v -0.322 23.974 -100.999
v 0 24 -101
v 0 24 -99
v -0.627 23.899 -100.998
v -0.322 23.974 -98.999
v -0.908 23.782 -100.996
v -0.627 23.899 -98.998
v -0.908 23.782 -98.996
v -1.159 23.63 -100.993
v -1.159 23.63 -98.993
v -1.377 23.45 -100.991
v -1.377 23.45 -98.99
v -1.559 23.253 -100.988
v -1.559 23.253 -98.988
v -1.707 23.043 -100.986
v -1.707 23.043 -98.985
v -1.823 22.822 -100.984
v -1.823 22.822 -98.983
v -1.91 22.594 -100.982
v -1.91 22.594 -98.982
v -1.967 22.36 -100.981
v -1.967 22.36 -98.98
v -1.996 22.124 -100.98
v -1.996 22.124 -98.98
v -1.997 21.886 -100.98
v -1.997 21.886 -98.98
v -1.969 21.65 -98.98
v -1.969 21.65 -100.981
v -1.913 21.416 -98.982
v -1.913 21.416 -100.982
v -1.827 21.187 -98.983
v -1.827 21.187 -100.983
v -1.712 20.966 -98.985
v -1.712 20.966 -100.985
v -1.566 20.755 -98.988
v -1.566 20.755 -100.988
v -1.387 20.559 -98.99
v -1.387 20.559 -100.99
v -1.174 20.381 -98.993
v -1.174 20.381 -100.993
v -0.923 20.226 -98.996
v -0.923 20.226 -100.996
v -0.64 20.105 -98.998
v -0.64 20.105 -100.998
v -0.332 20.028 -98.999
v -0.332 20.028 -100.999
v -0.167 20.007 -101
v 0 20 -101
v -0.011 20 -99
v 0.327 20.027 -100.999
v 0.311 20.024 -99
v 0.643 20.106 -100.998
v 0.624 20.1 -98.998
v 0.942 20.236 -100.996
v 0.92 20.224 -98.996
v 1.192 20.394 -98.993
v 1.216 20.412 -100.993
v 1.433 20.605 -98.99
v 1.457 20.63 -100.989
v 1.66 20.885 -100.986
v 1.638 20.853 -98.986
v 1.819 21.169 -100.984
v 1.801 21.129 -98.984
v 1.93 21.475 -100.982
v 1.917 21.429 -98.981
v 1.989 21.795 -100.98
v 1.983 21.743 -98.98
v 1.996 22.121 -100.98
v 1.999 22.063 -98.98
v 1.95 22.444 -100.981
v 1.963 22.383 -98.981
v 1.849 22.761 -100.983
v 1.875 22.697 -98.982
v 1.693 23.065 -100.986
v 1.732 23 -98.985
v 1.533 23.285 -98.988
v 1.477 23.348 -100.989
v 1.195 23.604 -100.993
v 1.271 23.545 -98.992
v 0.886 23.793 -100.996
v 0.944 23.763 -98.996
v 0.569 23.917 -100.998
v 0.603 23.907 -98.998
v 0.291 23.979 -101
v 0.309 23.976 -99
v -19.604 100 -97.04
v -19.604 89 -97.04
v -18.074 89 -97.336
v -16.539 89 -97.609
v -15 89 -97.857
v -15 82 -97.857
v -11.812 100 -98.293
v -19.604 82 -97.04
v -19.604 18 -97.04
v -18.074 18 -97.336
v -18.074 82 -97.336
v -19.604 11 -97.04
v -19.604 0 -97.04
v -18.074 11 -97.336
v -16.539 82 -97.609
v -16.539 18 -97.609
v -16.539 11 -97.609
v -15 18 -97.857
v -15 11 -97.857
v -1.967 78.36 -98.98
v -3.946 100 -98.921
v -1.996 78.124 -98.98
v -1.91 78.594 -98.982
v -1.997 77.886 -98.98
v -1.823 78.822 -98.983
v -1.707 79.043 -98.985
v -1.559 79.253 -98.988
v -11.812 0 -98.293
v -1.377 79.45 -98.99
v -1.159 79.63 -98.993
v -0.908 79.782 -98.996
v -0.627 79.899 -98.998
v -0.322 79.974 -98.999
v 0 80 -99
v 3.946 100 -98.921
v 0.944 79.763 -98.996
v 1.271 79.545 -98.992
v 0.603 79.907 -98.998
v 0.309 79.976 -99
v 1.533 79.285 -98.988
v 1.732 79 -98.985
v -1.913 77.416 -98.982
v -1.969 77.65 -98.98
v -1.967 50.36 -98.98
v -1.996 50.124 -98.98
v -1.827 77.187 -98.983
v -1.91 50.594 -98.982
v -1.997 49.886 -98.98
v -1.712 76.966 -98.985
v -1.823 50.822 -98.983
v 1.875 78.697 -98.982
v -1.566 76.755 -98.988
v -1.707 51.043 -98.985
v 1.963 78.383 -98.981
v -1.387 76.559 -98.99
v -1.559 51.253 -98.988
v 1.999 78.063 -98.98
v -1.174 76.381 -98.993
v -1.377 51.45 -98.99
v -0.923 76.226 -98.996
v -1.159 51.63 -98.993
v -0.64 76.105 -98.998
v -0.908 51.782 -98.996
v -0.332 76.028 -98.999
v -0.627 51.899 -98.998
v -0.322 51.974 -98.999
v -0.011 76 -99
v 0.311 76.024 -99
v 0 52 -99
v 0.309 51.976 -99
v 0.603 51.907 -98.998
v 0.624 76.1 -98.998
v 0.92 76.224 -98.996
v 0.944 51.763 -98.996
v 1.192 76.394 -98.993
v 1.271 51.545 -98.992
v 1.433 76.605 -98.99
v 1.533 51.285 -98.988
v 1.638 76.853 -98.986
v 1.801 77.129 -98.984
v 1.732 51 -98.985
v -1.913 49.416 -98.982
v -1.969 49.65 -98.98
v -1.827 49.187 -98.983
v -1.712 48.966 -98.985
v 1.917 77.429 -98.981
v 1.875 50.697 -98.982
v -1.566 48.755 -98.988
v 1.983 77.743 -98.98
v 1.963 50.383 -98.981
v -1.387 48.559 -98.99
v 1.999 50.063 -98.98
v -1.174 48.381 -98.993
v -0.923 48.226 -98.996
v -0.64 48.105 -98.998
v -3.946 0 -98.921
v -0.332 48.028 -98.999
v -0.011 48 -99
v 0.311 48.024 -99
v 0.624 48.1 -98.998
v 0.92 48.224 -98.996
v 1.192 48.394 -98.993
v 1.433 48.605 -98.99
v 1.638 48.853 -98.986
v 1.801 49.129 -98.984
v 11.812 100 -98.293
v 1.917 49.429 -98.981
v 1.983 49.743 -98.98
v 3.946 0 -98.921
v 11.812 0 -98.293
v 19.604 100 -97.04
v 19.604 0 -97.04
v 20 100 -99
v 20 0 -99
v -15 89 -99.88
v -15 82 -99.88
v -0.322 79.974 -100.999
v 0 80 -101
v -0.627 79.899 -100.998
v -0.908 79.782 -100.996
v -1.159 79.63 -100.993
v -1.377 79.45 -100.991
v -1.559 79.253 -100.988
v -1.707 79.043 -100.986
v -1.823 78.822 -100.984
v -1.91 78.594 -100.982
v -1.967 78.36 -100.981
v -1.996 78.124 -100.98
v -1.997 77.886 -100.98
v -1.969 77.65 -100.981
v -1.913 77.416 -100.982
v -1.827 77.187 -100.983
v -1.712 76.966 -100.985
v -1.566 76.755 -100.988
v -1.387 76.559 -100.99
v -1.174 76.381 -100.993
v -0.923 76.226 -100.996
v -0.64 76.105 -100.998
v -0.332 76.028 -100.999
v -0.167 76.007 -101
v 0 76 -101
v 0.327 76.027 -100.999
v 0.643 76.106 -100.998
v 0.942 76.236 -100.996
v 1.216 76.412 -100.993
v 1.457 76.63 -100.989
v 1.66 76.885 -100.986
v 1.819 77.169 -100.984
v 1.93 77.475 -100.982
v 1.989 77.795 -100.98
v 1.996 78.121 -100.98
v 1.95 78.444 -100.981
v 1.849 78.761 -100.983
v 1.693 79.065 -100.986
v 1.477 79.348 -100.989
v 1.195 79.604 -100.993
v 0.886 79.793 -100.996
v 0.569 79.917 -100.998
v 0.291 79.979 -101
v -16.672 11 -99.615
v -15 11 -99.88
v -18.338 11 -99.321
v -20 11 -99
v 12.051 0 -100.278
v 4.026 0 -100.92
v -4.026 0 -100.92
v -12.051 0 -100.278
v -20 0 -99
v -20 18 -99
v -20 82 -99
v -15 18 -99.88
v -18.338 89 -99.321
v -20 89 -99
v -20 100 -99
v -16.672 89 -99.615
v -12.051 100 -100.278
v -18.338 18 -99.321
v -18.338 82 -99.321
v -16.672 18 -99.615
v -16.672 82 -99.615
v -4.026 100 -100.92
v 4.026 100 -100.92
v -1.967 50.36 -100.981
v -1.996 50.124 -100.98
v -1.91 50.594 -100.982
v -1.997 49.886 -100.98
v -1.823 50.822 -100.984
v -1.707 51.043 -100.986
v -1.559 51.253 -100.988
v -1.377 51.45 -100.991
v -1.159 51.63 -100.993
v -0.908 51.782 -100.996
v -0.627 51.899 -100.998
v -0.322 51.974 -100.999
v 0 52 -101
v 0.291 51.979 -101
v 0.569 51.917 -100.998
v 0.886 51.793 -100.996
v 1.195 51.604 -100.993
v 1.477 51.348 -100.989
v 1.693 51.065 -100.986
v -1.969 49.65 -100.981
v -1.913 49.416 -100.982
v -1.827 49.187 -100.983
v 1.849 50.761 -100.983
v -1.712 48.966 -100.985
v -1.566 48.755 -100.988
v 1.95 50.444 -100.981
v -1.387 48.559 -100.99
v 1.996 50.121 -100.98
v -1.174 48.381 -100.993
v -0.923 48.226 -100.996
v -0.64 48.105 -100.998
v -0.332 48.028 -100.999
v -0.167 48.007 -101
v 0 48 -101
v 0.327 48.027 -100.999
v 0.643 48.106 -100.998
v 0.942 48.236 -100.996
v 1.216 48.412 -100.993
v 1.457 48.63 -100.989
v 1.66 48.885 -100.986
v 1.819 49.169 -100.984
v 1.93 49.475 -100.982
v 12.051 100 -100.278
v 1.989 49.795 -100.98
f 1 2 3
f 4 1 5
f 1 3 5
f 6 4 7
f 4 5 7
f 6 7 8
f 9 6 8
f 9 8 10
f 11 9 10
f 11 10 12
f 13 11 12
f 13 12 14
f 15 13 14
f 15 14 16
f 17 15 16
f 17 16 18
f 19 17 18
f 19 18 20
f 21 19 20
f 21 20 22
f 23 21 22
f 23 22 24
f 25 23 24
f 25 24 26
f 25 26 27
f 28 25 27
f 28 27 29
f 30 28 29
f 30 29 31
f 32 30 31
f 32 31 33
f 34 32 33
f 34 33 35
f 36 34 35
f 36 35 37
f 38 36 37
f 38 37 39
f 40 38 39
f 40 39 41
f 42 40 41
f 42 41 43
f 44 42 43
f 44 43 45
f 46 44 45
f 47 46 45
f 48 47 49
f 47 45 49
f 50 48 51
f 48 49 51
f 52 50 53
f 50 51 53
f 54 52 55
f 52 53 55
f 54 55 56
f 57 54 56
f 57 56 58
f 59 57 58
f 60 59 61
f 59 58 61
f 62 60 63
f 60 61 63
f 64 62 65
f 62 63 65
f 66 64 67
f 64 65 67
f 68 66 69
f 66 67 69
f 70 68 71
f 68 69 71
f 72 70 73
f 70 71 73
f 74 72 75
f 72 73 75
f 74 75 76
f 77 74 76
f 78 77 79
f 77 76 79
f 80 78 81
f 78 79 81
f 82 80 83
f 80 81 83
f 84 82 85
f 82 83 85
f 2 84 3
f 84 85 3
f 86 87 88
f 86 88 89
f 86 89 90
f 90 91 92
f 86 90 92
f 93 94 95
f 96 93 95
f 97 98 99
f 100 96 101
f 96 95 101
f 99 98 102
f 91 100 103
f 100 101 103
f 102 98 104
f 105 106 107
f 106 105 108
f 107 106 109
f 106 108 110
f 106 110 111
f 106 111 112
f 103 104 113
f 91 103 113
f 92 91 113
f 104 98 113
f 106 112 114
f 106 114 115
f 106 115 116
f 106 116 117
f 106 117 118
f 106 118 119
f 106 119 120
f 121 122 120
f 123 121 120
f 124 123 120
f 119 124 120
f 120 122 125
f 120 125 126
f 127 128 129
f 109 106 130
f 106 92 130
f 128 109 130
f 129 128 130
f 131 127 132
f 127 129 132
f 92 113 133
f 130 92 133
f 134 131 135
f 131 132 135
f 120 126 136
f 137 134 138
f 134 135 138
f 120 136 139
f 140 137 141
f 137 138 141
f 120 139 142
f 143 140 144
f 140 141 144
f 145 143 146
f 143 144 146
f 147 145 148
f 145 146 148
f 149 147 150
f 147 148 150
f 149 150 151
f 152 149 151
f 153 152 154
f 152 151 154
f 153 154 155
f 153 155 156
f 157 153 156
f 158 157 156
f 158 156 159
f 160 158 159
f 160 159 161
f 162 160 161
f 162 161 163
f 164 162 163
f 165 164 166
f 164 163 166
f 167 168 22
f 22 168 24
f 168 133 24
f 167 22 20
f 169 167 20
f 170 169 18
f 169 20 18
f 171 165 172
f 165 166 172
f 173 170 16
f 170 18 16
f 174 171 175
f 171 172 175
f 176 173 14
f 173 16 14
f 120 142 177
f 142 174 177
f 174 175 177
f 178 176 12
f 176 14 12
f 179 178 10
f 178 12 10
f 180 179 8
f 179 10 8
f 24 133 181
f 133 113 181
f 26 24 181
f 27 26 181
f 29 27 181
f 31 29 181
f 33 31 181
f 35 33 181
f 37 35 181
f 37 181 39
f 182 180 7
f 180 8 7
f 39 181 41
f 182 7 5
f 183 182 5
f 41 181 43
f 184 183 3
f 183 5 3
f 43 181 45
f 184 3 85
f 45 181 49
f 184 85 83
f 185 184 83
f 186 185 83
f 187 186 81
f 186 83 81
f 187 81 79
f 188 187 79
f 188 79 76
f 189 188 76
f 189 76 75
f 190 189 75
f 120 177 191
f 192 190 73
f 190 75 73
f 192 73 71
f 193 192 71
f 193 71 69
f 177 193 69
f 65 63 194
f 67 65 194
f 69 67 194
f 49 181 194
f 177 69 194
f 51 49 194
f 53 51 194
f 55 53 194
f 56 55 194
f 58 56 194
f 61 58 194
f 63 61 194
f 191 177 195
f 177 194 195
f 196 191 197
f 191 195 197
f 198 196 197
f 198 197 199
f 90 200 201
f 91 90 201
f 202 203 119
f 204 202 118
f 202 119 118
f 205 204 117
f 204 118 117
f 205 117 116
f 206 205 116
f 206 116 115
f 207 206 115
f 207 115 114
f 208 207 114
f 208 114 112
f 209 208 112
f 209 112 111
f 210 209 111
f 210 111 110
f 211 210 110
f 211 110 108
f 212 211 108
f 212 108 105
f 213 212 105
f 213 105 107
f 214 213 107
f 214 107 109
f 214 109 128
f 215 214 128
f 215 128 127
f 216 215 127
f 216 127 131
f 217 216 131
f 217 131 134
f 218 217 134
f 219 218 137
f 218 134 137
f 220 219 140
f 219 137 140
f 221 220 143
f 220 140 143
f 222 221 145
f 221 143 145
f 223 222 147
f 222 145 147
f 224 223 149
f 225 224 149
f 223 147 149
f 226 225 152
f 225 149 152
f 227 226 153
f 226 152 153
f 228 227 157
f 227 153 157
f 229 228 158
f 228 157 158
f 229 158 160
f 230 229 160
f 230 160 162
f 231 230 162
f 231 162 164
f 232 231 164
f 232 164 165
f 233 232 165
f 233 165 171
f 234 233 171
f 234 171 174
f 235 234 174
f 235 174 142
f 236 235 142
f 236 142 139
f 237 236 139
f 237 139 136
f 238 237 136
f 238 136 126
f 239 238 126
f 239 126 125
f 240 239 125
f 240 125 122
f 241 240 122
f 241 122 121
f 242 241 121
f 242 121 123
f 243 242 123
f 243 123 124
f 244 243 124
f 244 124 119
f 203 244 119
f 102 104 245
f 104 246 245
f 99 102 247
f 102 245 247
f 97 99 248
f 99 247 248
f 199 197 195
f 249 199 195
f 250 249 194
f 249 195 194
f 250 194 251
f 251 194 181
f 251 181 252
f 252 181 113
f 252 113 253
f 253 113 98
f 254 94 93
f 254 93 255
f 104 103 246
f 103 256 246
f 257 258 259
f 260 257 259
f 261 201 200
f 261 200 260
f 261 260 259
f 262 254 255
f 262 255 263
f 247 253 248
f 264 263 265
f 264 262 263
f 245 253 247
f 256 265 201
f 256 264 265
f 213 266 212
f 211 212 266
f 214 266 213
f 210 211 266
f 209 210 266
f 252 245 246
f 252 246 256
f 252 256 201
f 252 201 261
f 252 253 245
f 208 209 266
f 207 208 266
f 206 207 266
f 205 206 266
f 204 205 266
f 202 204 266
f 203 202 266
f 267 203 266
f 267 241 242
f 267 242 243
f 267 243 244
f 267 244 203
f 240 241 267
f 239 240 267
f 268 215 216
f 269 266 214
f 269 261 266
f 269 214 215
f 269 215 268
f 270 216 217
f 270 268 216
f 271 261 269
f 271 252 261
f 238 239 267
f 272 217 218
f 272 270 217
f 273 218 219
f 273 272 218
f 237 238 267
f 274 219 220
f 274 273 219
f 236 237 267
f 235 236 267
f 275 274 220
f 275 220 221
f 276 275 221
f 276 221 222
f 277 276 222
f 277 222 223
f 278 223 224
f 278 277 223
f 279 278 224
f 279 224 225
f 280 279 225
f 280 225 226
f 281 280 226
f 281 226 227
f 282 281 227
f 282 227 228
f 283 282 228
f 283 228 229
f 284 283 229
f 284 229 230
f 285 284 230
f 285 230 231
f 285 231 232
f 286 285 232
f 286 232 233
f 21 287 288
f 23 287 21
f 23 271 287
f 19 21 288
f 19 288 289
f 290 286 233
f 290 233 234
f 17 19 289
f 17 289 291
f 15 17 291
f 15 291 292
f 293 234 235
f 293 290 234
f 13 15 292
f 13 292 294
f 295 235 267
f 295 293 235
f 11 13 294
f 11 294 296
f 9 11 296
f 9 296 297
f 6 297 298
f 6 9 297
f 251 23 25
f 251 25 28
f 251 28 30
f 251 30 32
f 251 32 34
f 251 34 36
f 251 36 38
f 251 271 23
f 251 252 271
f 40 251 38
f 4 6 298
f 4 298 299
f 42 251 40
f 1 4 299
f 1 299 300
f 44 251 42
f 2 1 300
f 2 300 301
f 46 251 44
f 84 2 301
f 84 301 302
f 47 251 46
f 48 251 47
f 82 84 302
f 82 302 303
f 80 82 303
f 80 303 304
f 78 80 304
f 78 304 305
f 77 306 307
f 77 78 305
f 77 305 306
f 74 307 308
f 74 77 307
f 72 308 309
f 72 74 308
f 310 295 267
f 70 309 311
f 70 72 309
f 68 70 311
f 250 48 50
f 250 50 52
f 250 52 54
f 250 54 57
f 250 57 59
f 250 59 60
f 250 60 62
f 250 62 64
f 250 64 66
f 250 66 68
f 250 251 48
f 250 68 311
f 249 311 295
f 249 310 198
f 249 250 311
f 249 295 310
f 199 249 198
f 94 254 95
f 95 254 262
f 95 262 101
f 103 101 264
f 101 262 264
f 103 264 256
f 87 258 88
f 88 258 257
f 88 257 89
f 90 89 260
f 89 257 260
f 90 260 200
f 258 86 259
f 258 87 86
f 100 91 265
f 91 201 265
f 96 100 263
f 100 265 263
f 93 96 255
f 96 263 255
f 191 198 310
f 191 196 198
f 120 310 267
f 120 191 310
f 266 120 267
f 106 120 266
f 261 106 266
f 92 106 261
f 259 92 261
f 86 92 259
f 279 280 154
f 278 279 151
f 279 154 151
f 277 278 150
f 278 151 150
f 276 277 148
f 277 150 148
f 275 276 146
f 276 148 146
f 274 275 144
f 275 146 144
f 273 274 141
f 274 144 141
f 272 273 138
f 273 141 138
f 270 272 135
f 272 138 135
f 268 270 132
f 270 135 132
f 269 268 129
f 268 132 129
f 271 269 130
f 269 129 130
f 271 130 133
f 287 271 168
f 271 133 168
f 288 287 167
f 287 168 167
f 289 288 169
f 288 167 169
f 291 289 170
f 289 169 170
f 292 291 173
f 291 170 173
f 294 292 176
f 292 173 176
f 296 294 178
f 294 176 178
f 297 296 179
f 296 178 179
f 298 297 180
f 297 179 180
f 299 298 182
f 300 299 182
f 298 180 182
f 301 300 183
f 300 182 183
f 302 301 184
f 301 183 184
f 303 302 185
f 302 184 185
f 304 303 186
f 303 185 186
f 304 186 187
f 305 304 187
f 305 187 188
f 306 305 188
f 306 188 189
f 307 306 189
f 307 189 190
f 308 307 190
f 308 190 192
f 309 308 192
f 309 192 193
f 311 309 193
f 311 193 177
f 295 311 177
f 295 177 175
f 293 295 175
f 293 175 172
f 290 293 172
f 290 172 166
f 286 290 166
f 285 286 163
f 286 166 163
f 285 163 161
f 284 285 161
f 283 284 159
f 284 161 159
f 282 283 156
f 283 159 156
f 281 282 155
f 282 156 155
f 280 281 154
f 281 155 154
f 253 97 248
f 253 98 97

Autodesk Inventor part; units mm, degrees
ref_plane "YZ Plane" through (0, 0, 0) normal (1, 0, 0) x (0, 1, 0)
ref_plane "XZ Plane" through (0, 0, 0) normal (0, 1, 0) x (-1, 0, 0)
sketch "Sketch1" plane through (0, 0, 0) normal (0, 1, 0) x (-1, 0, 0)
  arc A0 (-19.604, -97.0396) -> (19.604, -97.0396) centre (0, 0) ccw
  line L0 (19.604, -97.0396) -> (20, -99)
  line L1 (-19.604, -97.0396) -> (-20, -99)
  arc A1 (-20, -99) -> (20, -99) centre (0, 0) ccw
  line L2 (0, 0) -> (0, 18.8083) construction
  point P0 (0, -99)
  point P1 (0, -101)
  dimension "d0" = 2
  dimension "d1" = 101
  dimension "d2" = 40
  dimension "d3" = 99
extrude "Extrusion1" add sketch "Sketch1" along normal blind 100
ref_plane "Work Plane1" through (0, 0, -101) normal (0, 0, -1) x (-1, 0, 0)
sketch "Sketch2" plane through (0, 0, -101) normal (0, 0, -1) x (-1, 0, 0)
  line L0 (-20, 0) -> (20, 0) projected
  line L1 (20, 0) -> (20, 100) projected
  line L2 (-20, 100) -> (20, 100) projected
  line L3 (-20, 0) -> (-20, 100) projected
  point P0 (0, 0)
  point P1 (0, 22)
  point P2 (0, 22)
  point P3 (0, 50)
  point P4 (0, 78)
  point P5 (0, 100)
  dimension "d7" = 22
  dimension "d8" = 22
  dimension "d9" = 28
  dimension "d10" = 28
hole "Hole1" at (0, 22, -101) at (0, 50, -101) at (0, 78, -101) direction (0, 0, 1) diameter 4 end through all
sketch "Sketch3" plane through (0, 0, -101) normal (0, 0, -1) x (-1, 0, 0)
  line L0 (20, 0) -> (20, 100) projected
  line L1 (20, 100) -> (-20, 100) projected
  line L2 (20, 0) -> (-20, 0) projected
  line L3 (20, 89) -> (15, 89)
  line L4 (15, 89) -> (15, 82)
  line L5 (15, 82) -> (20, 82)
  line L6 (20, 18) -> (15, 18)
  line L7 (15, 18) -> (15, 11)
  line L8 (15, 11) -> (20, 11)
  point P0 (0, 0)
  point P1 (0, 52)
  point P2 (0, 48)
  dimension "d18" = 7
  dimension "d19" = 5
  dimension "d20" = 11
  dimension "d21" = 5
  dimension "d22" = 11
  dimension "d23" = 7
extrude "Extrusion2" cut sketch "Sketch3" against normal up to surface
equation "\"d8\" = d7"
equation "\"d10\" = d9"
properties part number "214,2"
